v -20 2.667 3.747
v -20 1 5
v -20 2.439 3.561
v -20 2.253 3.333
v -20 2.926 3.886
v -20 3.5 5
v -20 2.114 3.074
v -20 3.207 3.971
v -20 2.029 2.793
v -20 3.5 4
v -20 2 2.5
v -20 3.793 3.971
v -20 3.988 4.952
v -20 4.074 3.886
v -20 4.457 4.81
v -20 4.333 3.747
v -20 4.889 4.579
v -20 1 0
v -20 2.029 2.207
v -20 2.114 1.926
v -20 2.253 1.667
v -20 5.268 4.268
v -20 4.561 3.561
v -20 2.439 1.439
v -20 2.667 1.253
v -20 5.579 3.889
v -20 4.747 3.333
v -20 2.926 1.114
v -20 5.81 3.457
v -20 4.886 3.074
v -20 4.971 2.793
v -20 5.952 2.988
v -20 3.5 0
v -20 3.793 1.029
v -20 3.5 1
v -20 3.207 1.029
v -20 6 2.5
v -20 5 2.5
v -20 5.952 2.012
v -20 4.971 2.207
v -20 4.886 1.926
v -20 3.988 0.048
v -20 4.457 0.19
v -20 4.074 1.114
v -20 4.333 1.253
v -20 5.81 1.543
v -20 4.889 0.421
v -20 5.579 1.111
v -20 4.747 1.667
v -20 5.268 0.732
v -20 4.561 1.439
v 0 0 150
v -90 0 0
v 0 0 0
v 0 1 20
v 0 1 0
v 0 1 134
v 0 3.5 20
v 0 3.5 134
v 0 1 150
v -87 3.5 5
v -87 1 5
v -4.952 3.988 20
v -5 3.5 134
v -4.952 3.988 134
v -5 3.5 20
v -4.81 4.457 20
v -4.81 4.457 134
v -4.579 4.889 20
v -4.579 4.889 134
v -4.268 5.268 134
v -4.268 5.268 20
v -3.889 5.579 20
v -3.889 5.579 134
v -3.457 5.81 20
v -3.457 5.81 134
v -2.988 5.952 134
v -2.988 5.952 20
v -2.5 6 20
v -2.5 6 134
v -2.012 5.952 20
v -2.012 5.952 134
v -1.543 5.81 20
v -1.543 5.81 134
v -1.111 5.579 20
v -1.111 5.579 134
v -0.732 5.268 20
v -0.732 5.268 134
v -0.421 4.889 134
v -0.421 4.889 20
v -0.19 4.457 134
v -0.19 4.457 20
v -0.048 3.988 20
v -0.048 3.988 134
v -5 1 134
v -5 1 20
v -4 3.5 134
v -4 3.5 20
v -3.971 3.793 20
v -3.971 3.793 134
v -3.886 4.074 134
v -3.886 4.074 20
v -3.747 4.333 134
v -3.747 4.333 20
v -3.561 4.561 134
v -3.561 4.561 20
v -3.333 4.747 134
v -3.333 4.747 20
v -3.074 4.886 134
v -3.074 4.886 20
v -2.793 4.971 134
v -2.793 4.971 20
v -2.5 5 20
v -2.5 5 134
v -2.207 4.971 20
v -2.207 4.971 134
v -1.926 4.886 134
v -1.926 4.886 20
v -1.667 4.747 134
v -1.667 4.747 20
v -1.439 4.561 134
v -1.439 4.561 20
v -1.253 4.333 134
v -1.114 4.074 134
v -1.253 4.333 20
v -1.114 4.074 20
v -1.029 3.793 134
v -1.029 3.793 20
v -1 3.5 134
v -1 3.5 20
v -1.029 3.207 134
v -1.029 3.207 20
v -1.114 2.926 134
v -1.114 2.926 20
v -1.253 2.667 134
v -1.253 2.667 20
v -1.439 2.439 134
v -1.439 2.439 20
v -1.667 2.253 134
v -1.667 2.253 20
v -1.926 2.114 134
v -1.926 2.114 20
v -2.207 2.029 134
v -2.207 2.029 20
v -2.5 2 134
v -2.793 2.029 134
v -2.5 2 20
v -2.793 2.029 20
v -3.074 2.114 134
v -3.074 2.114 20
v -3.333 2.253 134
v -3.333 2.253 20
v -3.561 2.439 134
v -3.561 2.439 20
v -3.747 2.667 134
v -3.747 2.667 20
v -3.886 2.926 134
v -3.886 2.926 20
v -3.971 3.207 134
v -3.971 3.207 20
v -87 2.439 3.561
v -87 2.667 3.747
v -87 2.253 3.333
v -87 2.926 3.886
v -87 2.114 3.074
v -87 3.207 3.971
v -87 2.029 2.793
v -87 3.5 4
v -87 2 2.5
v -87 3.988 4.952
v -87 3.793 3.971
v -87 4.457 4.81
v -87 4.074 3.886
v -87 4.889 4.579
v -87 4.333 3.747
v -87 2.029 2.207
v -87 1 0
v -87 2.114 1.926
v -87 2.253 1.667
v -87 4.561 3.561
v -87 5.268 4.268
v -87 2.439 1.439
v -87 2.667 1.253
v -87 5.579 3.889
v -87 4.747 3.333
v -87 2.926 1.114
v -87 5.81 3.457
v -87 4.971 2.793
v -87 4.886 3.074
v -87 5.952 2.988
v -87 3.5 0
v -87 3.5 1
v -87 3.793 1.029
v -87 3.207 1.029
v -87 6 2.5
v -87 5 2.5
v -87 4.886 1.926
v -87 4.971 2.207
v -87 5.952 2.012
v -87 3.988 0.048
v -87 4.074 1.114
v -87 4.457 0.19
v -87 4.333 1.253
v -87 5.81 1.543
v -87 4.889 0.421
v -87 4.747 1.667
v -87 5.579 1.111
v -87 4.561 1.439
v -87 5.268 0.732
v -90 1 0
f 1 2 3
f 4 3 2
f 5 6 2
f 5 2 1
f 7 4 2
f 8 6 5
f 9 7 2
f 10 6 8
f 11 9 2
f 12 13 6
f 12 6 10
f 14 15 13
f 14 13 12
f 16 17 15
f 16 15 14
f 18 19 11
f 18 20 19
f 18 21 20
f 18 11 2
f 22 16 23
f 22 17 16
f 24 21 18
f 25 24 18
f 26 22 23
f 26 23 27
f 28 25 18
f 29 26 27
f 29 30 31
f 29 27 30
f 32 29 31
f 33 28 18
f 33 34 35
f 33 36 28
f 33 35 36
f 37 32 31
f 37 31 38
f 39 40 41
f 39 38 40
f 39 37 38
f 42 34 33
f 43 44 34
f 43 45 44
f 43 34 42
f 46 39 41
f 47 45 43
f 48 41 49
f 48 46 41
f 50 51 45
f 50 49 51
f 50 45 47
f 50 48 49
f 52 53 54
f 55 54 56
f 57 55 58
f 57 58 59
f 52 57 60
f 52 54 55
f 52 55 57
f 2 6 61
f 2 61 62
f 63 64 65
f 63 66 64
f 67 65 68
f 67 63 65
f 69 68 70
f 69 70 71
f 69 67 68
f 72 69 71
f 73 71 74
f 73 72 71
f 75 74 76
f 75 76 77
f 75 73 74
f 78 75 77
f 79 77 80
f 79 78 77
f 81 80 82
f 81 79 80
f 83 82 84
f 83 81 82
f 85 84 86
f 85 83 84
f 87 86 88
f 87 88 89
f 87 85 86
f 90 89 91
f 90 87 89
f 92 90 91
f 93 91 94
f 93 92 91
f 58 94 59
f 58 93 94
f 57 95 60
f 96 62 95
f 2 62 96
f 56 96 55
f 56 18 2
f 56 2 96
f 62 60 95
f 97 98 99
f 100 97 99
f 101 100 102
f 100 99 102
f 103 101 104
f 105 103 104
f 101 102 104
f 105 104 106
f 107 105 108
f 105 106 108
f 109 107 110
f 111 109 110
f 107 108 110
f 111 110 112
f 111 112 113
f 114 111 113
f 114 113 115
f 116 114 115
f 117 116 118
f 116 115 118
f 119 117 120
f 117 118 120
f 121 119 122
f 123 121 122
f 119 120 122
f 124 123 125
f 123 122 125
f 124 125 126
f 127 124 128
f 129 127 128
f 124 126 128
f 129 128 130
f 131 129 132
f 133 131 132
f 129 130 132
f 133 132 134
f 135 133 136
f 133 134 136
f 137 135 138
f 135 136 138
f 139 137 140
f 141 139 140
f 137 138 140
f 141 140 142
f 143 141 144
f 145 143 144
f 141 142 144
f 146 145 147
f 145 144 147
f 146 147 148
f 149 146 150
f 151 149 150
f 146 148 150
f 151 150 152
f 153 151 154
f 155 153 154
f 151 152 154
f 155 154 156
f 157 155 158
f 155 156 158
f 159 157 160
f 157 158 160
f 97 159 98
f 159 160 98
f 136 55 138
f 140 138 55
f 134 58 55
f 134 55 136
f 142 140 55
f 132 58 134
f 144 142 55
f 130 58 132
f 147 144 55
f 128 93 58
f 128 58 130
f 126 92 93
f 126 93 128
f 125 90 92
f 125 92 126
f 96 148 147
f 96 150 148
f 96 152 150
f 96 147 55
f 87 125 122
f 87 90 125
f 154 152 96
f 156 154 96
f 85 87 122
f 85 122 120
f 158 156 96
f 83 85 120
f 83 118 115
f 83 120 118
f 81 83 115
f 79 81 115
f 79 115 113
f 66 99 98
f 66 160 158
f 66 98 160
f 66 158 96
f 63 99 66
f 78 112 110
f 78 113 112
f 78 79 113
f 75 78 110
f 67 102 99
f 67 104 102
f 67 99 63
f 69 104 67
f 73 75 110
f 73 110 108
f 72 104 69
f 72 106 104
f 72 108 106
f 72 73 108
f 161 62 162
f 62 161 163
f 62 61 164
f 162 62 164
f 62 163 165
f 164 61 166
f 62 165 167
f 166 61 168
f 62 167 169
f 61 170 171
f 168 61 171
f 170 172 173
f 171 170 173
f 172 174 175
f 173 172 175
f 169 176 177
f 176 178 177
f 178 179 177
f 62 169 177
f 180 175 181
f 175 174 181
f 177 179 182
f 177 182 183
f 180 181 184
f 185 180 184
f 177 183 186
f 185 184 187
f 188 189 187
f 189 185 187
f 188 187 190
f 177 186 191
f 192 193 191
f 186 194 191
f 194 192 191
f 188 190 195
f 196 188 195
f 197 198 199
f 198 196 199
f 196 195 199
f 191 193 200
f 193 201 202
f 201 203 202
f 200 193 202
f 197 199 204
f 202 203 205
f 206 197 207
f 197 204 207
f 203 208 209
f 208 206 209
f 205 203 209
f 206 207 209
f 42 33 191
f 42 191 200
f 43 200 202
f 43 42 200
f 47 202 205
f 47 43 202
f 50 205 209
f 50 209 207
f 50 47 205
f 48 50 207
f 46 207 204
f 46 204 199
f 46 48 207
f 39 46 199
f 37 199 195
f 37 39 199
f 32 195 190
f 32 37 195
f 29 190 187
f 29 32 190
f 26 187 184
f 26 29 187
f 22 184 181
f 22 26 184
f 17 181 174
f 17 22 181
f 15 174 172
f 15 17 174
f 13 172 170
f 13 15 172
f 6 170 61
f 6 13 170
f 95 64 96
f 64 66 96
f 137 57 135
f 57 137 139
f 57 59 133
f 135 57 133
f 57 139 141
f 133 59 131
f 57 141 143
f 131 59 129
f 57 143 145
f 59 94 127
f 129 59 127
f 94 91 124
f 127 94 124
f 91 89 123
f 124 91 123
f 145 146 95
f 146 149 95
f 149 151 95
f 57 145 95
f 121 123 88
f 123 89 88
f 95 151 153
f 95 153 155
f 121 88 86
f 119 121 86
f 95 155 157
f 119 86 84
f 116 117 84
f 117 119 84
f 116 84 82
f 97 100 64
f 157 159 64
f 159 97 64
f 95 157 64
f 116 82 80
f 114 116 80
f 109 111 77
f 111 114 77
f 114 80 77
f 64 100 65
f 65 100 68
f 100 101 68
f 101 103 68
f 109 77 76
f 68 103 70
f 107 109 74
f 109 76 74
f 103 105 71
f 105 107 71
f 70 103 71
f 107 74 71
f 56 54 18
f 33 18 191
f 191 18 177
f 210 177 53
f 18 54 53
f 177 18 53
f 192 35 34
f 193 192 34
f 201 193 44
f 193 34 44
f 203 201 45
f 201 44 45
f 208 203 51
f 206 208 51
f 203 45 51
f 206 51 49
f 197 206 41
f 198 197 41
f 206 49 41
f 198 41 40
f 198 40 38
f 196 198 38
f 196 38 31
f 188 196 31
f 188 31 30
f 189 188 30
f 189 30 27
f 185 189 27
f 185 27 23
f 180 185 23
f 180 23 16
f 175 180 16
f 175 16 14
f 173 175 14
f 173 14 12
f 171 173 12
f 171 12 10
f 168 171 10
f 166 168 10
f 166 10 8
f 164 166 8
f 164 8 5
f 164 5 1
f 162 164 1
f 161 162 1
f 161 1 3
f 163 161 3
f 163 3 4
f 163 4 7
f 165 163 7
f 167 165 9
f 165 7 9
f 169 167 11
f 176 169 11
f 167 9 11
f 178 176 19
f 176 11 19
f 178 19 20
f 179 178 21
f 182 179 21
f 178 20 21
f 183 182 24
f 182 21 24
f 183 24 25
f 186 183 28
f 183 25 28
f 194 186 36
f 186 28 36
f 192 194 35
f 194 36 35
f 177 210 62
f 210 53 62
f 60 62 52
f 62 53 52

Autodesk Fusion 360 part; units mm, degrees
sketch "スケッチ1" plane through (0, 0, 0) normal (0, 1, 0) x (1, 0, 0)
  line L0 (0, 0) -> (0, -150)
  line L1 (0, 0) -> (-90, 0)
  line L2 (-90, 0) -> (0, -150)
  dimension "d1" = 150
  dimension "d2" = 90
extrude "押し出し1" add sketch "スケッチ1" along normal blind 1
ref_plane "作業平面1" through (-45, 0.5, 20) normal (0, 0, -1) x (-1, 0, 0)
sketch "スケッチ2" plane through (0, 0, 20) normal (0, 0, -1) x (-1, 0, 0)
  circle A0 centre (2.5, 3.5) radius 1.5
  line L0 (0, 1) -> (90, 1)
  line L1 (0, 1.75) -> (0, 22.5)
  circle A1 centre (2.5, 3.5) radius 2.5
  line L2 (5, 3.5) -> (5, 1)
  line L3 (0, 3.5) -> (0, 1)
  dimension "d6" = 3
  dimension "d7" = 1
extrude "押し出し2" add sketch "スケッチ2" against normal blind 114
ref_plane "作業平面2" through (-20, 1.75, 75) normal (1, 0, 0) x (0, 0, -1)
sketch "スケッチ3" plane through (-20, 0, 0) normal (1, 0, 0) x (0, 0, -1)
  circle A0 centre (-2.5, 3.5) radius 1.5
  circle A1 centre (-2.5, 3.5) radius 2.5
  line L0 (-20, 1) -> (0, 1)
  line L1 (0, 1.75) -> (0, 22.5)
  line L2 (0, 3.5) -> (0, 1)
  line L3 (-5, 3.5) -> (-5, 1)
  dimension "d11" = 3
  dimension "d12" = 1
extrude "押し出し3" add sketch "スケッチ3" against normal blind 67
